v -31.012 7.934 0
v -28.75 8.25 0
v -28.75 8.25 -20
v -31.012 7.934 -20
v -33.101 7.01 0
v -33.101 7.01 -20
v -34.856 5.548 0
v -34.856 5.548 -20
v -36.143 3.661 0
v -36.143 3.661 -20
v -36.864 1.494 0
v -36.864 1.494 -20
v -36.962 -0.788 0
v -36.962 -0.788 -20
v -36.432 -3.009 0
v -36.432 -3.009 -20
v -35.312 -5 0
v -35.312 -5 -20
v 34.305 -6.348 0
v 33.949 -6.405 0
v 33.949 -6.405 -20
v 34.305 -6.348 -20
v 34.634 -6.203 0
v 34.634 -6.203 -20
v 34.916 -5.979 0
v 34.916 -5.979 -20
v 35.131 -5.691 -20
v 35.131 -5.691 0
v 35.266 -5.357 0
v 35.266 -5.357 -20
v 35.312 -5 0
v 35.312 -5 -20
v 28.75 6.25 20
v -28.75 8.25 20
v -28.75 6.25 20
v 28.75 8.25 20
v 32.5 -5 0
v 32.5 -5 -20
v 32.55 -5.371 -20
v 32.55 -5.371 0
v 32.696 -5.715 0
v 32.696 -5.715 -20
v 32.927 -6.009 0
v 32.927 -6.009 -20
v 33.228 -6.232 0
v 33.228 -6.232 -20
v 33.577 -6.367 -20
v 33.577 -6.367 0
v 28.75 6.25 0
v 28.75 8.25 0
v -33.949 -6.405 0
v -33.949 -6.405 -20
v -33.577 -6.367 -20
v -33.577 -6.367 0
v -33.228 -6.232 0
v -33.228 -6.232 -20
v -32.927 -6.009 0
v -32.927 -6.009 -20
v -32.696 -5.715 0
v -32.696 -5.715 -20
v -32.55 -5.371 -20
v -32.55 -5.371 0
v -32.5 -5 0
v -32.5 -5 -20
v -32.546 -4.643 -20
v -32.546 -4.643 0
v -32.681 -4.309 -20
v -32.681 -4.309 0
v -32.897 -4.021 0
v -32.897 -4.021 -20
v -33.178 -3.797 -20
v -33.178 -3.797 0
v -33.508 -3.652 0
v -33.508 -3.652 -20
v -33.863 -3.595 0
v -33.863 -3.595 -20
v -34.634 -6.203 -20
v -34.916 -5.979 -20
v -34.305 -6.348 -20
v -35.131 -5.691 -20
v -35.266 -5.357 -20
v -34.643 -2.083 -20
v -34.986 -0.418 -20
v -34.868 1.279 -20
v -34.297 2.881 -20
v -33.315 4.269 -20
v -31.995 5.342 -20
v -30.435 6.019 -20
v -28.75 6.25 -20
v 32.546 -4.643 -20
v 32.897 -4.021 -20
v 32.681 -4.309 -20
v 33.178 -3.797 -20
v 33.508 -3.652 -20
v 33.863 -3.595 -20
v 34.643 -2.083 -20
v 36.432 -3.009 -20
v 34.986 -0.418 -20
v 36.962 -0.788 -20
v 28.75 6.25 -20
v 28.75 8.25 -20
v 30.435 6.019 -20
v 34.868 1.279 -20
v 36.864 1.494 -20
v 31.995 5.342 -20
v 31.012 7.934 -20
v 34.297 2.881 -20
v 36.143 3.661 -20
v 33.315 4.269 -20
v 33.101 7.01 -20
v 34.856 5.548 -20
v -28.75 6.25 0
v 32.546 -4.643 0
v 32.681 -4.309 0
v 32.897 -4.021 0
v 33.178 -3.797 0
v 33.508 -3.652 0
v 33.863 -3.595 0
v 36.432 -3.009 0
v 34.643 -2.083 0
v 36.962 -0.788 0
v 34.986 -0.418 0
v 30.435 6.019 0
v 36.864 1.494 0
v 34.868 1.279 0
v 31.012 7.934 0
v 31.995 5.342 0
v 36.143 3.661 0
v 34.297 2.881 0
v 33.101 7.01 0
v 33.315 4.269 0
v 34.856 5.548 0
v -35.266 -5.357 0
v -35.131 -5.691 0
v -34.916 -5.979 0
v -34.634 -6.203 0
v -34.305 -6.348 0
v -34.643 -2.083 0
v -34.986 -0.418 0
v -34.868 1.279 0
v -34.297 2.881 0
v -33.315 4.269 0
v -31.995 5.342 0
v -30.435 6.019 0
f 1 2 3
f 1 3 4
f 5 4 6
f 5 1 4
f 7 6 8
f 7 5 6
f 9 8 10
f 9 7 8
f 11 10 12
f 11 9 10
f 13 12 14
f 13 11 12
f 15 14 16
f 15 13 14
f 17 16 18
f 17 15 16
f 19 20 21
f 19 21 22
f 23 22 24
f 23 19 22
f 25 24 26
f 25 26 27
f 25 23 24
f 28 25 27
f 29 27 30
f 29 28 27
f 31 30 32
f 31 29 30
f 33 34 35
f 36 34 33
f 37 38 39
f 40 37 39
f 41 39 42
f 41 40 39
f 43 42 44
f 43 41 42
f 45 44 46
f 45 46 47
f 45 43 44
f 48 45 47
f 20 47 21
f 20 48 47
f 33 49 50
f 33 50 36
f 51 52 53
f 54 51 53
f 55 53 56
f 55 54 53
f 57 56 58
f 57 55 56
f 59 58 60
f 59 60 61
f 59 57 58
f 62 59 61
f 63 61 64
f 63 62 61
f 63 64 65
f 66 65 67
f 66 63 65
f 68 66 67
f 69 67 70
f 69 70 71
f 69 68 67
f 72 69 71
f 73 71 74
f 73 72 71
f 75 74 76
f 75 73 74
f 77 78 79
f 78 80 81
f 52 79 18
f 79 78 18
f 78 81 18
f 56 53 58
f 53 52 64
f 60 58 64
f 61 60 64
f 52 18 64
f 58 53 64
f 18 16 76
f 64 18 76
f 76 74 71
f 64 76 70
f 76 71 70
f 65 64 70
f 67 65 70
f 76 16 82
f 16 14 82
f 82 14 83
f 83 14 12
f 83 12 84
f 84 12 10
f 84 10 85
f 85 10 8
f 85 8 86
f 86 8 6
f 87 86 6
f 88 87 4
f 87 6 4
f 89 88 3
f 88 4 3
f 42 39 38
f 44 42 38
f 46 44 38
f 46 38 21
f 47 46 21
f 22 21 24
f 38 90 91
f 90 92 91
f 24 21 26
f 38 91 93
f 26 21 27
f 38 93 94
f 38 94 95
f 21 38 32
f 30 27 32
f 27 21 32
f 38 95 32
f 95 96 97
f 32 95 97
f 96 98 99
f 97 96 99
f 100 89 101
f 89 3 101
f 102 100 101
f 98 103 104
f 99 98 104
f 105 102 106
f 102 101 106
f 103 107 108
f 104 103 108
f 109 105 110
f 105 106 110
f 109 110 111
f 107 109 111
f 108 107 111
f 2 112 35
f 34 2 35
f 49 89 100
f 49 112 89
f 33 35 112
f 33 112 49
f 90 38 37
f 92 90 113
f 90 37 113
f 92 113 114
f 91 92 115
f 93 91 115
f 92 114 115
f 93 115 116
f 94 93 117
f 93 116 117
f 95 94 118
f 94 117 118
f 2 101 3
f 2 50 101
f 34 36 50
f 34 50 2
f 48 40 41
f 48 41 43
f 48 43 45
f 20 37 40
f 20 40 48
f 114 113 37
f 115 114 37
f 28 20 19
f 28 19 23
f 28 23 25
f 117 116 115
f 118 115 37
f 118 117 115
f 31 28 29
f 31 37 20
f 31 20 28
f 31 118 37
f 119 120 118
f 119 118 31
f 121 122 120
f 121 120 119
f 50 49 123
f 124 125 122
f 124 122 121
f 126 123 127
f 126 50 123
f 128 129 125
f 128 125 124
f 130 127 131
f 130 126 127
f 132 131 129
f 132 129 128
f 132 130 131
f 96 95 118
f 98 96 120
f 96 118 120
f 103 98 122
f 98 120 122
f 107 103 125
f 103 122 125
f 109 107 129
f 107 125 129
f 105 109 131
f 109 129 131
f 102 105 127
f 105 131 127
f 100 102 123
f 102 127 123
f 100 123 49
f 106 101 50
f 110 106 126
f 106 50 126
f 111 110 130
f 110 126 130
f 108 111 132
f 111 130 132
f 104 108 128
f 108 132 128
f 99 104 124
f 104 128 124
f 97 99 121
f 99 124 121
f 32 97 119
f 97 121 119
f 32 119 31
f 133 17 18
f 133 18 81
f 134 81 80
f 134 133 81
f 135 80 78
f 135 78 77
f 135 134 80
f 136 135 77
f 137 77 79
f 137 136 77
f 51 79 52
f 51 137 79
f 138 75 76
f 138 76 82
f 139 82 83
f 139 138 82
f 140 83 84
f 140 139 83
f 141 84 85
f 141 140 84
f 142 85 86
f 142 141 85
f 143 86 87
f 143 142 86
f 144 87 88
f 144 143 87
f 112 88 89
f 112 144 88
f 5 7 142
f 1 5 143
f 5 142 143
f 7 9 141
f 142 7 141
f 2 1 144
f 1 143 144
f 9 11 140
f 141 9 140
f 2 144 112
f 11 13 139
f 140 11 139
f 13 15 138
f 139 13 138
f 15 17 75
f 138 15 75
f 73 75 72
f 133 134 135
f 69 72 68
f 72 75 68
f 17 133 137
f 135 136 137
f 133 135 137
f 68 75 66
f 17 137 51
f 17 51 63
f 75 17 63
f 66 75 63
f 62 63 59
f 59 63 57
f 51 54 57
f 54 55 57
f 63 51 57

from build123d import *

# Parameters (mm, degrees)
F1_DEPTH = 20
F2_W     = 18.2070606947
F2_H     = 20
F2_W_2   = 57.5
F2_W_3   = 18.4121565521
F3_DEPTH = 25
F4_DEPTH = 25


# Not quite as in the source:
# - a pattern or mirror of a feature is missing from the dataset's text; its kind, count and spacing are read off the source's solid


with BuildPart() as f1:
    # F0 (on Top) → F1 (new body, symmetric)
    with BuildSketch(Plane.XY):
        with BuildLine():
            Line((-28.75, 8.25), (-28.75, 6.25))
            Line((-28.75, 6.25), (-23.3648351929, 6.25))
            ThreePointArc((-23.3648351929, 6.25), (-25.8777186767, 7.7338541491), (-28.75, 8.25))
        make_face()
        with BuildLine():
            ThreePointArc((-33.8628873162, -3.5945630182), (-34.2965538339, 2.8806666881), (-28.75, 6.25))
            Line((-28.75, 6.25), (-28.75, 8.25))
            ThreePointArc((-28.75, 8.25), (-36.1429865413, 3.661454629), (-35.3122023742, -5))
            ThreePointArc((-35.3122023742, -5), (-34.8849672334, -3.9905735233), (-33.8628873162, -3.5945630182))
        make_face()
        with BuildLine():
            ThreePointArc((-28.75, 8.25), (-25.8777186767, 7.7338541491), (-23.3648351929, 6.25))
            Line((-23.3648351929, 6.25), (23.3648351929, 6.25))
            ThreePointArc((23.3648351929, 6.25), (25.8777186767, 7.7338541491), (28.75, 8.25))
            Line((28.75, 8.25), (-28.75, 8.25))
        make_face()
        with BuildLine():
            ThreePointArc((-32.5, -5), (-32.8966747104, -4.0211339537), (-33.8628873162, -3.5945630182))
            ThreePointArc((-33.8628873162, -3.5945630182), (-33.2368147022, -4.3509761925), (-32.5, -5))
        make_face()
        with BuildLine():
            ThreePointArc((-32.5, -5), (-33.2368147022, -4.3509761925), (-33.8628873162, -3.5945630182))
            ThreePointArc((-33.8628873162, -3.5945630182), (-34.8849672334, -3.9905735233), (-35.3122023742, -5))
            Line((-35.3122023742, -5), (-32.5, -5))
        make_face()
        with BuildLine():
            ThreePointArc((28.75, 8.25), (25.8777186767, 7.7338541491), (23.3648351929, 6.25))
            Line((23.3648351929, 6.25), (28.75, 6.25))
            Line((28.75, 6.25), (28.75, 8.25))
        make_face()
        with BuildLine():
            ThreePointArc((-33.949315058, -6.4054369818), (-32.9272351408, -6.0094264767), (-32.5, -5))
            Line((-32.5, -5), (-35.3122023742, -5))
            ThreePointArc((-35.3122023742, -5), (-34.672595407, -5.7432885741), (-33.949315058, -6.4054369818))
        make_face()
        with BuildLine():
            ThreePointArc((-33.949315058, -6.4054369818), (-34.672595407, -5.7432885741), (-35.3122023742, -5))
            ThreePointArc((-35.3122023742, -5), (-34.9155276638, -5.9788660463), (-33.949315058, -6.4054369818))
        make_face()
    extrude(amount=F1_DEPTH, both=True)



with BuildPart() as f1b:
    # F0 (on Top) → F1, piece 2 (new body, symmetric)
    with BuildSketch(Plane.XY):
        with BuildLine():
            ThreePointArc((33.949315058, -6.4054369818), (34.9155276638, -5.9788660463), (35.3122023742, -5))
            ThreePointArc((35.3122023742, -5), (34.672595407, -5.7432885741), (33.949315058, -6.4054369818))
        make_face()
        with BuildLine():
            ThreePointArc((33.949315058, -6.4054369818), (34.672595407, -5.7432885741), (35.3122023742, -5))
            Line((35.3122023742, -5), (32.5, -5))
            ThreePointArc((32.5, -5), (32.9272351408, -6.0094264767), (33.949315058, -6.4054369818))
        make_face()
        with BuildLine():
            Line((32.5, -5), (35.3122023742, -5))
            ThreePointArc((35.3122023742, -5), (34.8849672334, -3.9905735233), (33.8628873162, -3.5945630182))
            ThreePointArc((33.8628873162, -3.5945630182), (33.2368147022, -4.3509761925), (32.5, -5))
        make_face()
    extrude(amount=F1_DEPTH, both=True)


with BuildPart() as f1_1:
    add(f1.part)

    add(f1b.part)  # F1_copies merges F1b
    # F1_copies: F1 across plane
    add(f1.part.mirror(Plane(origin=(0, 0, 0), x_dir=(0, 0, 1), z_dir=(1, 0, 0))))

    # F2 (on Front) → F3 (cut)
    with BuildSketch(Plane.XZ):
        with Locations((-37.8535303473, 10)):
            Rectangle(F2_W, F2_H)
        with Locations((0, 10)):
            Rectangle(F2_W_2, F2_H)
        with Locations((37.956078276, 10)):
            Rectangle(F2_W_3, F2_H)
    extrude(amount=F3_DEPTH, mode=Mode.SUBTRACT)

    # F2 (on Front) → F4 (cut)
    with BuildSketch(Plane.XZ):
        with Locations((-37.8535303473, 10)):
            Rectangle(F2_W, F2_H)
        with Locations((37.956078276, 10)):
            Rectangle(F2_W_3, F2_H)
    extrude(amount=-F4_DEPTH, mode=Mode.SUBTRACT)


solid = f1_1.part
